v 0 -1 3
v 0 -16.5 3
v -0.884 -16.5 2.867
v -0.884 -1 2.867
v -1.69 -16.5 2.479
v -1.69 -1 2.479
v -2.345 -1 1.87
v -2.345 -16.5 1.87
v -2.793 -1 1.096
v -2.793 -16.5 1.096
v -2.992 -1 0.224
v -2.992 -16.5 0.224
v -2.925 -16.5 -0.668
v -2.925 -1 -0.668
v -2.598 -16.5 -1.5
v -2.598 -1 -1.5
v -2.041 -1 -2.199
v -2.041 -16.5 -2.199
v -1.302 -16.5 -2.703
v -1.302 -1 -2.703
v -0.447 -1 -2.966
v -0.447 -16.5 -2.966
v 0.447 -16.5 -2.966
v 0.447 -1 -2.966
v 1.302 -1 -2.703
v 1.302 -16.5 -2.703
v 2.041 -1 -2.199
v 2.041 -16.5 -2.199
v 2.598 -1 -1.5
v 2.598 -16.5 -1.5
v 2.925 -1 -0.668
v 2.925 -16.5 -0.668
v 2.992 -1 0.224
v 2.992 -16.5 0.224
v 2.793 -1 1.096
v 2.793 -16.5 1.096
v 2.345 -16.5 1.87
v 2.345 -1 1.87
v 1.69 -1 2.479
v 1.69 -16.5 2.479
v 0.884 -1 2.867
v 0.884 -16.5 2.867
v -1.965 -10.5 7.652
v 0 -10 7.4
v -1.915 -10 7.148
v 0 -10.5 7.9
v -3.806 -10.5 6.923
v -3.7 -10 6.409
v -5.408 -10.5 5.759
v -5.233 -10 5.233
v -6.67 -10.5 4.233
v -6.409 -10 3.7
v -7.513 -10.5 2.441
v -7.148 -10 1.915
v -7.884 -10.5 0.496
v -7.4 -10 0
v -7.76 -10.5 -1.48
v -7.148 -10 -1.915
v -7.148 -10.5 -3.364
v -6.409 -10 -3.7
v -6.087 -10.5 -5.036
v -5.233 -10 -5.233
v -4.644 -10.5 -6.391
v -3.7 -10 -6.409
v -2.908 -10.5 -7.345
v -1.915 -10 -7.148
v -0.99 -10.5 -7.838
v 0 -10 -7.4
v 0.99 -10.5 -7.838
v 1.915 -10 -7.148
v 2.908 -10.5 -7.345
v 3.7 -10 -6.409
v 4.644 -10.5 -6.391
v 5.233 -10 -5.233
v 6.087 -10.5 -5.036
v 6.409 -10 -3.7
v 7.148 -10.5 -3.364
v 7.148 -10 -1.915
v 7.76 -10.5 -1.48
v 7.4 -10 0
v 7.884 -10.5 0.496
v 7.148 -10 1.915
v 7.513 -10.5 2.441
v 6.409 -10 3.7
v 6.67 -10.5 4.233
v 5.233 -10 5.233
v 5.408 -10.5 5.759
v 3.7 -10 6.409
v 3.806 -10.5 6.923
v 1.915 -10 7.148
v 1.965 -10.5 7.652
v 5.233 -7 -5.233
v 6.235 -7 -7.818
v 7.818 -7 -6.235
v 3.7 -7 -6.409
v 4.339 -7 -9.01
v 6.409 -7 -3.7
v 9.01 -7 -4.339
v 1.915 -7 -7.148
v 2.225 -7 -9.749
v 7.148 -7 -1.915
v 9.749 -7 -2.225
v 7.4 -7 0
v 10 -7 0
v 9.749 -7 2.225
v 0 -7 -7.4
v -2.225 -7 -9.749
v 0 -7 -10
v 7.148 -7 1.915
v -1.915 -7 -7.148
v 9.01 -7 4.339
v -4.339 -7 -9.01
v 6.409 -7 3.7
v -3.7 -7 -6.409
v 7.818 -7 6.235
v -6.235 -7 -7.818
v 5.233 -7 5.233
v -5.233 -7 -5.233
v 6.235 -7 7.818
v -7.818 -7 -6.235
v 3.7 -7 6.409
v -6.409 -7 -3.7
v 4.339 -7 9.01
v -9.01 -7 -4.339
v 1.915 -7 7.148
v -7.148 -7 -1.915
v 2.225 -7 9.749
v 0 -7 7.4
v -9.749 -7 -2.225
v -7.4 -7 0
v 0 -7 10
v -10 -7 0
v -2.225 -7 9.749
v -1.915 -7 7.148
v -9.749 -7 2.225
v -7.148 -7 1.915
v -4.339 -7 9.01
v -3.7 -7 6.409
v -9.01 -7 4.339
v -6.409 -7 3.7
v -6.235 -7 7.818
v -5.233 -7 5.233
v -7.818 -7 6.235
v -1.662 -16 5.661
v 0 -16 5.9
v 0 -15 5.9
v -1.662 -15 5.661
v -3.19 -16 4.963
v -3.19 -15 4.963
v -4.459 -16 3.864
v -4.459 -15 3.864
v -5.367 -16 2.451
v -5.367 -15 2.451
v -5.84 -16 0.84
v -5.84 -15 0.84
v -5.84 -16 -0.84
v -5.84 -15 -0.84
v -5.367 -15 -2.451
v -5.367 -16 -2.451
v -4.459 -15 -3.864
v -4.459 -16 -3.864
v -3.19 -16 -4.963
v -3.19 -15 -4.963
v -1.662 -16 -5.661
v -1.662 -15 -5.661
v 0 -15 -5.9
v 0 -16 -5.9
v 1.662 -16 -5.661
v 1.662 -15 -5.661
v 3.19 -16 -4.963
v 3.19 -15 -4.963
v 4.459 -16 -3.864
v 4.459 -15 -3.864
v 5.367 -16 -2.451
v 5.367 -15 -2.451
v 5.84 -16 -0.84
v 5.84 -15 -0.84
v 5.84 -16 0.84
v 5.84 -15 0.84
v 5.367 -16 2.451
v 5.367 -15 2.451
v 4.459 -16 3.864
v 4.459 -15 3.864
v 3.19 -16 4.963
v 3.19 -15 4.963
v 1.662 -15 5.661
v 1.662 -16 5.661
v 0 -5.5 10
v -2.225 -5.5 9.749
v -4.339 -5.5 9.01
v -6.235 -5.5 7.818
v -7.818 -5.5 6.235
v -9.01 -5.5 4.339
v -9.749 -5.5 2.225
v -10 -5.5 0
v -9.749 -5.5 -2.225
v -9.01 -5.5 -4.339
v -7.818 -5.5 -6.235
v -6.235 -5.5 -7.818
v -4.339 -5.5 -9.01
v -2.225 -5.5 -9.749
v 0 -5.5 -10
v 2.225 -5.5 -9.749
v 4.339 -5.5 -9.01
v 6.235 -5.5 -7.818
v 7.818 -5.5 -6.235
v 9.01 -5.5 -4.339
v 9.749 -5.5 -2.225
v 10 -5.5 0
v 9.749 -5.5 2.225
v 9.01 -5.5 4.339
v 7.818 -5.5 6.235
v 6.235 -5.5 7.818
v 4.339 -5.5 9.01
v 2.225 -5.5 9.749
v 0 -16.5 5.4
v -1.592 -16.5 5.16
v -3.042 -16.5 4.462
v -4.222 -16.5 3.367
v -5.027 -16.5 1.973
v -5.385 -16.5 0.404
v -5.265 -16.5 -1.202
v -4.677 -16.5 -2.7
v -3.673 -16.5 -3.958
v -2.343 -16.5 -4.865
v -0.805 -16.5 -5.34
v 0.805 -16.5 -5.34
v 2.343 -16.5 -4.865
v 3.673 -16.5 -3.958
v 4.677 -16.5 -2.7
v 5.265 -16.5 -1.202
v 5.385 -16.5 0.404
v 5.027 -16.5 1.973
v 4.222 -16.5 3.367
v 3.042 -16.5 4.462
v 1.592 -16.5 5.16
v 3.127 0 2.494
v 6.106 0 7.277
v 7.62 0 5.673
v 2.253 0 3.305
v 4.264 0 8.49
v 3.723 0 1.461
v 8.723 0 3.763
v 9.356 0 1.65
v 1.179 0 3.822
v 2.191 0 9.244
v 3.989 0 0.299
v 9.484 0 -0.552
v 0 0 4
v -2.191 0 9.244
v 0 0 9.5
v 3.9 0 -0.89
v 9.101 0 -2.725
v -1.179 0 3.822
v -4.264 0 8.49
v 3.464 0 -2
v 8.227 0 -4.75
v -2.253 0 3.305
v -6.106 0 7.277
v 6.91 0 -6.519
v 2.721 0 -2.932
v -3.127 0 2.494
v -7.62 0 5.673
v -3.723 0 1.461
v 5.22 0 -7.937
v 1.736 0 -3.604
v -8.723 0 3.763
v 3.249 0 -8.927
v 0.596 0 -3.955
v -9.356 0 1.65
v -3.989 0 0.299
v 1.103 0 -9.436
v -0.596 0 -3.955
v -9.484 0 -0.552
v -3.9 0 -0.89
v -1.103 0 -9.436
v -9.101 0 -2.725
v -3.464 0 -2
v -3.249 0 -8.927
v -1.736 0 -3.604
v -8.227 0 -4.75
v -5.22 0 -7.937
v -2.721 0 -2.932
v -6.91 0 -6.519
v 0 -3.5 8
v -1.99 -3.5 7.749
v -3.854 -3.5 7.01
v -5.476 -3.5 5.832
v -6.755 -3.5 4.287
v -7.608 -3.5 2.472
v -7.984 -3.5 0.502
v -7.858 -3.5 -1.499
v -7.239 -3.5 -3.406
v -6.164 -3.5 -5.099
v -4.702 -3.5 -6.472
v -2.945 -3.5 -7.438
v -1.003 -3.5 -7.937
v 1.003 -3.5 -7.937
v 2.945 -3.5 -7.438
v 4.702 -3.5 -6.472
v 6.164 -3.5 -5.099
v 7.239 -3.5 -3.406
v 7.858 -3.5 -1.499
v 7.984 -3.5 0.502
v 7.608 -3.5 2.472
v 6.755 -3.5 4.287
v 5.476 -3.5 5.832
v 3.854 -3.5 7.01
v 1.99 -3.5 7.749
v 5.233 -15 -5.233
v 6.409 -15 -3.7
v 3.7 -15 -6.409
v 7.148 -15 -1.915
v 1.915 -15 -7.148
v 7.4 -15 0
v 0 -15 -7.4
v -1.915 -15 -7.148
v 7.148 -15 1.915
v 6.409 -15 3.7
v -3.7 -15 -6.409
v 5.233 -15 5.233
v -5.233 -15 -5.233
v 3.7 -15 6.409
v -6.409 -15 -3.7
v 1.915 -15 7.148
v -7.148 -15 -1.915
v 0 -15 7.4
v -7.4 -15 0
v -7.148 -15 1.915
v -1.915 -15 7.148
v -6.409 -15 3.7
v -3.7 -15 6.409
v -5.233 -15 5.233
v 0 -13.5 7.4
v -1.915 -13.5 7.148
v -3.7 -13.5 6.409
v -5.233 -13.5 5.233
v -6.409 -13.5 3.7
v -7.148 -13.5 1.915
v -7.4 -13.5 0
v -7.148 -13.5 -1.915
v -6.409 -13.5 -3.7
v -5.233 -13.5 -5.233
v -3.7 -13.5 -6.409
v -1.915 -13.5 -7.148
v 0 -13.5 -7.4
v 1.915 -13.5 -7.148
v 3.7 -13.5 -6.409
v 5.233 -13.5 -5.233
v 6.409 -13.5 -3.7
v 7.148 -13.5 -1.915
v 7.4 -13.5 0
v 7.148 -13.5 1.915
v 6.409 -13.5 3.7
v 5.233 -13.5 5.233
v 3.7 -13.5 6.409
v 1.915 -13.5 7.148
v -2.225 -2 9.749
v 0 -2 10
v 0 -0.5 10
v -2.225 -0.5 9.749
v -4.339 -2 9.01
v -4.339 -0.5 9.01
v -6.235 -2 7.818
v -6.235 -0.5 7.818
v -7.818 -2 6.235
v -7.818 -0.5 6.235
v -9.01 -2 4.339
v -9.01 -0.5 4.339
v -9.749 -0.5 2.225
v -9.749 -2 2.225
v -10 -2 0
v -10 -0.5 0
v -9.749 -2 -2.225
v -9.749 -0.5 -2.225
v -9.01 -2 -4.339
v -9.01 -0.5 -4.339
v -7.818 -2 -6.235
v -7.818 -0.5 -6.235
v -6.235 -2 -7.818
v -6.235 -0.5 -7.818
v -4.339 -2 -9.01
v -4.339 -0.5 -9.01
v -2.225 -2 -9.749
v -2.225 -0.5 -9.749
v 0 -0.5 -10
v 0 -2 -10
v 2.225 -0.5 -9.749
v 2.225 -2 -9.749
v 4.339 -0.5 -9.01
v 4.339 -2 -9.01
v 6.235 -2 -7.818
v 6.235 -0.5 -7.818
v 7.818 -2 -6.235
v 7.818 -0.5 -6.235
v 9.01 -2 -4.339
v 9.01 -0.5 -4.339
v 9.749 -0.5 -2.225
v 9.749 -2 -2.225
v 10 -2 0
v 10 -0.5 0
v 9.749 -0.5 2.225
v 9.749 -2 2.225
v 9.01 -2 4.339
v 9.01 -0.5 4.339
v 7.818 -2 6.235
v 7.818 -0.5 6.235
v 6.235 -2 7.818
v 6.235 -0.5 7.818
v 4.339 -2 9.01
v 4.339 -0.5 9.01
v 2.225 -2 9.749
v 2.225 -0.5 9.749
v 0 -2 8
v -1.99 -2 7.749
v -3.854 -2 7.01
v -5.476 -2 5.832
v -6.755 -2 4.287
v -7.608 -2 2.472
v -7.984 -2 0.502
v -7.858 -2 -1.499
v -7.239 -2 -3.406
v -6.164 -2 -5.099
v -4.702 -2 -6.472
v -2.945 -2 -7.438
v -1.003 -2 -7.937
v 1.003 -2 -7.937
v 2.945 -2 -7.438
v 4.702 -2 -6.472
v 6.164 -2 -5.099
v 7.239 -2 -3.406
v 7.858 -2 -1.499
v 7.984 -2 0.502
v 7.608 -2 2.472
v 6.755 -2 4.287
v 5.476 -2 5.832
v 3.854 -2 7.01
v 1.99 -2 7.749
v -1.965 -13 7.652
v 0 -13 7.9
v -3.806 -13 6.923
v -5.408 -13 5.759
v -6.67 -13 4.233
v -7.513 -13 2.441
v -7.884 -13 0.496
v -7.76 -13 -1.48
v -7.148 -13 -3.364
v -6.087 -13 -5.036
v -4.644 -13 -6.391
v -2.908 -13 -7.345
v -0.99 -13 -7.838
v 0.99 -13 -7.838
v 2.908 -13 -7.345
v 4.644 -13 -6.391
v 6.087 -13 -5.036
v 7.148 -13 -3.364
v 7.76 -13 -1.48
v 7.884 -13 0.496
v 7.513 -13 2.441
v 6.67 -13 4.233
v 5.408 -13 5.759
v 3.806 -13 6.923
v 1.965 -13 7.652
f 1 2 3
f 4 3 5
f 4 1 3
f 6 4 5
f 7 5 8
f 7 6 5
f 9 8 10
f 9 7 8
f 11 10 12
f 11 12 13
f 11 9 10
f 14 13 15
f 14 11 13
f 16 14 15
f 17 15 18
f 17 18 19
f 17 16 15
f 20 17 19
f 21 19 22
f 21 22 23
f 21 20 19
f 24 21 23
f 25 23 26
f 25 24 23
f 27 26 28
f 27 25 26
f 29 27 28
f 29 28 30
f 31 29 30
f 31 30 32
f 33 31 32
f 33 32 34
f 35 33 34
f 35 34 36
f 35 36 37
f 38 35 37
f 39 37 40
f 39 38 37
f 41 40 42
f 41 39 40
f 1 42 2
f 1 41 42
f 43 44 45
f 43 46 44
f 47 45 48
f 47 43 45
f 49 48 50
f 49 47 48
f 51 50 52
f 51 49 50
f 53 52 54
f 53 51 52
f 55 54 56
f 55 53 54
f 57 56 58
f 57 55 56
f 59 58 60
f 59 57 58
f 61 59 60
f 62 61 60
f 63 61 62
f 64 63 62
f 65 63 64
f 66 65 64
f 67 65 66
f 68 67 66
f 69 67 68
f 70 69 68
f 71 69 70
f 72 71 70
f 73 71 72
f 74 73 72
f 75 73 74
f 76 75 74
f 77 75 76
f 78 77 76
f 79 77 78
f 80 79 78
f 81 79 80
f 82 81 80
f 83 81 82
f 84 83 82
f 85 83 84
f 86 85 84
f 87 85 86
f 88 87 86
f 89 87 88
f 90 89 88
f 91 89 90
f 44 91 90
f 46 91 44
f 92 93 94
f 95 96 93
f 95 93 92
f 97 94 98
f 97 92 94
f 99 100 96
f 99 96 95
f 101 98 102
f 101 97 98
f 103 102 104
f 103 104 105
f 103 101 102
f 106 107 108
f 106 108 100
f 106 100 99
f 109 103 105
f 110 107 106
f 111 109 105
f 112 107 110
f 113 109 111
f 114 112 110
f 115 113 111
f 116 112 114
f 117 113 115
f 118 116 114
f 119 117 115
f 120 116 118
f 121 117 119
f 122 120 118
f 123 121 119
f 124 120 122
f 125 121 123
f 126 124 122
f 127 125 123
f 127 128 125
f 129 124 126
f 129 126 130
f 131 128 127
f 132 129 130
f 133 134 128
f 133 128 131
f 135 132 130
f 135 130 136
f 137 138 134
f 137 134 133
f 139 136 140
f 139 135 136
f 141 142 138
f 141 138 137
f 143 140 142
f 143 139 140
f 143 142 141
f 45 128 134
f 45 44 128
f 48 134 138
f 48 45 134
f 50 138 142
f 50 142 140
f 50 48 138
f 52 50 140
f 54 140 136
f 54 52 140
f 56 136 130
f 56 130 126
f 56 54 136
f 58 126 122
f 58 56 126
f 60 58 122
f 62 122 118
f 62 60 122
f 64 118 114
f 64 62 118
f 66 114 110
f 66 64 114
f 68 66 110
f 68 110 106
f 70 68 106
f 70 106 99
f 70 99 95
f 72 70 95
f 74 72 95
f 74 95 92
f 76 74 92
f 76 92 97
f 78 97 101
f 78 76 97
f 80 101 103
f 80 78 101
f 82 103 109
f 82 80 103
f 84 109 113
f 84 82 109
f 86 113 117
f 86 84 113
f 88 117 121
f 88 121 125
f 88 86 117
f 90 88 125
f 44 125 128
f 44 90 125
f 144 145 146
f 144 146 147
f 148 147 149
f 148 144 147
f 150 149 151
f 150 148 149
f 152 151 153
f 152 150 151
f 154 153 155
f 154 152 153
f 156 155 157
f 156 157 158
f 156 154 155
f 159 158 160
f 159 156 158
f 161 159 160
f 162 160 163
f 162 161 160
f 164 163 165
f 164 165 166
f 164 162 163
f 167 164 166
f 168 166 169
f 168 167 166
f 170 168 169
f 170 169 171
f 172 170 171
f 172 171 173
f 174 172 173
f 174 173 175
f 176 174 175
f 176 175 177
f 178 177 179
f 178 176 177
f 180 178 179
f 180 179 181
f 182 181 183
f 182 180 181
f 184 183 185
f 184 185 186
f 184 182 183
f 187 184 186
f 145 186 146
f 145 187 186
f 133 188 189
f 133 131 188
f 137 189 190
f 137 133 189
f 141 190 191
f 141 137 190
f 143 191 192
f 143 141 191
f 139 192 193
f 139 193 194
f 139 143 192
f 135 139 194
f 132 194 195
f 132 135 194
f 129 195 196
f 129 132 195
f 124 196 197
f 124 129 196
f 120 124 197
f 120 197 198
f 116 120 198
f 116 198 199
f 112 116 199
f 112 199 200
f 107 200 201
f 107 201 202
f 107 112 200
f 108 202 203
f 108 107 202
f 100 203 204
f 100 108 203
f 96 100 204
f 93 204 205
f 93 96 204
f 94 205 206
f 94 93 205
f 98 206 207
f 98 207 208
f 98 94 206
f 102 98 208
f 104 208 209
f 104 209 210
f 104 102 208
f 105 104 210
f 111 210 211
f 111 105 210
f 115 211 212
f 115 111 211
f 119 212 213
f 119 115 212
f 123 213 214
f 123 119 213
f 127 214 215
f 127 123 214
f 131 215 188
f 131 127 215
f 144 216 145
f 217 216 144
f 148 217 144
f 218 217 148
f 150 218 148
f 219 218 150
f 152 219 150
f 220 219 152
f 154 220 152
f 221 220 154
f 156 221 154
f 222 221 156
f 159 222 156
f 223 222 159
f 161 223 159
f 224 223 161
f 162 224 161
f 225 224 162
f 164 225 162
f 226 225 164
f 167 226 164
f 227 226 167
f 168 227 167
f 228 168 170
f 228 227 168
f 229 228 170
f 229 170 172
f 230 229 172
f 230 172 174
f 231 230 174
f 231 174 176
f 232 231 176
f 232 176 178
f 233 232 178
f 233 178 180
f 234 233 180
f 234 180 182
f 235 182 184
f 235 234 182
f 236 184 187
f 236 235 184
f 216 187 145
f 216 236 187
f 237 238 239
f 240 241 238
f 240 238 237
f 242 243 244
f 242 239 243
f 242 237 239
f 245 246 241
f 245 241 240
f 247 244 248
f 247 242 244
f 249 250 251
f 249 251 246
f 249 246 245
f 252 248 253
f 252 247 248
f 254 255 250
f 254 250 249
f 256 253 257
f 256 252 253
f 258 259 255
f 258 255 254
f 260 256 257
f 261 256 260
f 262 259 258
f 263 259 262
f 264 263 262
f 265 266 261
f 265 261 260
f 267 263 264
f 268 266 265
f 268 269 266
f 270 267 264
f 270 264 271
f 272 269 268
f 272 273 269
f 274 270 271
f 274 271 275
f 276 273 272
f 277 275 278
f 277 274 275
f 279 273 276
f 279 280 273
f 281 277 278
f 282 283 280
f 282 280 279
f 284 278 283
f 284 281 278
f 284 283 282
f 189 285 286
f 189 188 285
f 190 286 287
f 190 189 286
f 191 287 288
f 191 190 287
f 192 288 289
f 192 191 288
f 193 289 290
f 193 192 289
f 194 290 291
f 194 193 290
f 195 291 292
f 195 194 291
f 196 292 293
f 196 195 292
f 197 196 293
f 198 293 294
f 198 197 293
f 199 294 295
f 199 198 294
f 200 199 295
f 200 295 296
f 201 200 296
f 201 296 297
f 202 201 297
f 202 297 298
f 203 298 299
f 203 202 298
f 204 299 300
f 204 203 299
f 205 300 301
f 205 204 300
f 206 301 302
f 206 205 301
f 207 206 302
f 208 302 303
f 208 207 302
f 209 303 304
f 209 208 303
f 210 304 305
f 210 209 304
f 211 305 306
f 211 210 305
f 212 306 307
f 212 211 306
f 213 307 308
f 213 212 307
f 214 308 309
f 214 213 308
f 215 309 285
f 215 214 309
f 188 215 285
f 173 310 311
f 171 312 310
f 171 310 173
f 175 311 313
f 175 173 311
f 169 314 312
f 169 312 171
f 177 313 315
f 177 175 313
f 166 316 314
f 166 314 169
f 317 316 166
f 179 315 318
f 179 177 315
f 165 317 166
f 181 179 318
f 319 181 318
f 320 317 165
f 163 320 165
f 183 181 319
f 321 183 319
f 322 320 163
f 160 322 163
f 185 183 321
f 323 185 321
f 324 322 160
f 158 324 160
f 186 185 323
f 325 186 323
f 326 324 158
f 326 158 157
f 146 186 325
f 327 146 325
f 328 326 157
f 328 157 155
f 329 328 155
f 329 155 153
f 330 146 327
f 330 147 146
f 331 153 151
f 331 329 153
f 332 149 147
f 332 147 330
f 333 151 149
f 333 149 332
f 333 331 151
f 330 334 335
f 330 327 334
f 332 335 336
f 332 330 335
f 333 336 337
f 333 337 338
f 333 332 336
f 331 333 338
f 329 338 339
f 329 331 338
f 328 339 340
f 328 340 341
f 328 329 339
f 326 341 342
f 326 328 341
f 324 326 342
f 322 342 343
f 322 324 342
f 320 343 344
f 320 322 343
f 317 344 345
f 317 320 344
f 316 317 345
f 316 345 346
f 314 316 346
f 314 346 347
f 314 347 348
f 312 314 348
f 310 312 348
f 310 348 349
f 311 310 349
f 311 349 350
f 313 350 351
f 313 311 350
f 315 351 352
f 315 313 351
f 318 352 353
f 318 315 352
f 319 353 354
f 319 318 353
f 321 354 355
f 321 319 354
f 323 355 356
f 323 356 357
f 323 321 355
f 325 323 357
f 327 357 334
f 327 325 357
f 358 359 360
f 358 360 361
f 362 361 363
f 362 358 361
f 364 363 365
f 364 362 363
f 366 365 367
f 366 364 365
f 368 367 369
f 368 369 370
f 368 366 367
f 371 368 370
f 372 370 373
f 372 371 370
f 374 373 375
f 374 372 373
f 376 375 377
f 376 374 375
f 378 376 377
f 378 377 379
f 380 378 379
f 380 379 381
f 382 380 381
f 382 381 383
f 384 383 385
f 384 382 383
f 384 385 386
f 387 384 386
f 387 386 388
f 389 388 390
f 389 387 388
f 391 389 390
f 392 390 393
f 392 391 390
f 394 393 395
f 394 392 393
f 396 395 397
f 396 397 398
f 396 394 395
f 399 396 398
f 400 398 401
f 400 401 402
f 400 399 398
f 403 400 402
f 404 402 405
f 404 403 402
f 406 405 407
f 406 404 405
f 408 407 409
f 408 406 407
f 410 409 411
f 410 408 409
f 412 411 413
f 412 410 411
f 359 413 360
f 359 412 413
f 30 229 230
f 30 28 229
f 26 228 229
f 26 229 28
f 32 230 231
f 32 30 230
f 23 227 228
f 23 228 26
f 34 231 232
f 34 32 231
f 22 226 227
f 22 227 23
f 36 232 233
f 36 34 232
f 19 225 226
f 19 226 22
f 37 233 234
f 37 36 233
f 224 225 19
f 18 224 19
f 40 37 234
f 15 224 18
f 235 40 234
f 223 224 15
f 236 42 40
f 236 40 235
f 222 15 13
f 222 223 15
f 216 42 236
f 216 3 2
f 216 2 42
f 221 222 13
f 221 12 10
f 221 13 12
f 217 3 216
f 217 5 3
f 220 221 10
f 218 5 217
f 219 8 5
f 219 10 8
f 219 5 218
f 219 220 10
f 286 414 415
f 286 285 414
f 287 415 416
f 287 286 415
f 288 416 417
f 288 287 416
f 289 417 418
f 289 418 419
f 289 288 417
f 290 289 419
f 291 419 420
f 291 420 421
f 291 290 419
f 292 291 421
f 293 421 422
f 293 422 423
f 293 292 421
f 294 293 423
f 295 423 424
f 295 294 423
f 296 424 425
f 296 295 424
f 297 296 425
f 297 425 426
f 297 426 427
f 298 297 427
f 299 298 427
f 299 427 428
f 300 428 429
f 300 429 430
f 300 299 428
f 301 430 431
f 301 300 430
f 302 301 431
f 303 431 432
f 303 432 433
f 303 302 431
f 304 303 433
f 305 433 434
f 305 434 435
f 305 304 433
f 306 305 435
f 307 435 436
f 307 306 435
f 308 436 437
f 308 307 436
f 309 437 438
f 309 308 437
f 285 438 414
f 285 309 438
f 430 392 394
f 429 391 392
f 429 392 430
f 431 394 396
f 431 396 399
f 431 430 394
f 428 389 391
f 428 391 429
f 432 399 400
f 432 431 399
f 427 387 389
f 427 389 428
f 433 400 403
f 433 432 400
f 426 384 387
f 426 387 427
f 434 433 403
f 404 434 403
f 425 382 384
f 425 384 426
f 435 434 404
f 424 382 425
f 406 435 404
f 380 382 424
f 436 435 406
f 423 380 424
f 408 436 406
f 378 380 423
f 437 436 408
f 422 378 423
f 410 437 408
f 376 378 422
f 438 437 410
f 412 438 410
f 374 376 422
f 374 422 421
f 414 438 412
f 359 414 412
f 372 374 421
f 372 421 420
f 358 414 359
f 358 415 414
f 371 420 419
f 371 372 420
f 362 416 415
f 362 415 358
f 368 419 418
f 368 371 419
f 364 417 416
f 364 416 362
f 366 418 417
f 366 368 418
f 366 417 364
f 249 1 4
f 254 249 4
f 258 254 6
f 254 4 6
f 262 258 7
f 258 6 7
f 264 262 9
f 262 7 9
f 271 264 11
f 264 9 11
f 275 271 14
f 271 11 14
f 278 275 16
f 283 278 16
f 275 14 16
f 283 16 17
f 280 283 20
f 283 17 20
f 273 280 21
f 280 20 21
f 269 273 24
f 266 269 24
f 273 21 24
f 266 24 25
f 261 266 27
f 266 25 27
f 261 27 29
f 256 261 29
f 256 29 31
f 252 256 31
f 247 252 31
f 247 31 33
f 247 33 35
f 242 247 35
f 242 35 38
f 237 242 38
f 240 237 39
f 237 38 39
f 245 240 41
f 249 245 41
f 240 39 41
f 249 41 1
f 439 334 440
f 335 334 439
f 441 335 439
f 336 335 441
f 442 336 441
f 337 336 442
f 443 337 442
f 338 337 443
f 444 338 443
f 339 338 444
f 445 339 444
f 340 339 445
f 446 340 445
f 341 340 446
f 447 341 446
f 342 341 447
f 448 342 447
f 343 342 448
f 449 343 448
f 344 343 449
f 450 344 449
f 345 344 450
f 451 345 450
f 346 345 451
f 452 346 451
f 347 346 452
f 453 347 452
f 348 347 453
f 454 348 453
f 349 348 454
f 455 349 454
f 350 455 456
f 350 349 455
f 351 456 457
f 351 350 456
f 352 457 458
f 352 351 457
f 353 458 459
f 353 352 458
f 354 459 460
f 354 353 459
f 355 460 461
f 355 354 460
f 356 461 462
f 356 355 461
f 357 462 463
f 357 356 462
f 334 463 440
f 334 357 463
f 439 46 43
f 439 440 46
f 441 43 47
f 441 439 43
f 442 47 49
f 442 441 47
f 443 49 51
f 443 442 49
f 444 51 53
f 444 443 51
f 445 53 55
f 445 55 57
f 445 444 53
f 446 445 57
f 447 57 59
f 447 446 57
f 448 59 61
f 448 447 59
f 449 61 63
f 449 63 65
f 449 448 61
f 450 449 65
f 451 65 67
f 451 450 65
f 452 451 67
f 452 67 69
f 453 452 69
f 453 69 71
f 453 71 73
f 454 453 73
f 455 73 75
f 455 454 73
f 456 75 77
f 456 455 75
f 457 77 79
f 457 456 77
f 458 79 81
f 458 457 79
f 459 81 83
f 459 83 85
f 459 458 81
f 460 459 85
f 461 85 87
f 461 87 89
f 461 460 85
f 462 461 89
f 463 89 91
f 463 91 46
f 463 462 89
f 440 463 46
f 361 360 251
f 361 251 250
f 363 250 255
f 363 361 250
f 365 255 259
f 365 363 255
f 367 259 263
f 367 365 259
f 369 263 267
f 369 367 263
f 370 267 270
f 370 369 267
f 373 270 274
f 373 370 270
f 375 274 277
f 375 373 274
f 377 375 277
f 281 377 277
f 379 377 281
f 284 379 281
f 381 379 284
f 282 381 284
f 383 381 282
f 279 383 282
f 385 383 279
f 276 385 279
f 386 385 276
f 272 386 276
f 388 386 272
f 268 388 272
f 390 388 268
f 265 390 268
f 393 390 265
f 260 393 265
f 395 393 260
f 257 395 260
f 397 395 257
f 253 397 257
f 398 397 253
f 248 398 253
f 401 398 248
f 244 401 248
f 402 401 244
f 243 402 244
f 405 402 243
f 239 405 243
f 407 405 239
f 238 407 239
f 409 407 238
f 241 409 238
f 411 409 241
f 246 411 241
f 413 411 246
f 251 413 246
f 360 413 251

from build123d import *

# Parameters (mm, degrees)
CHAMFER_1_SIZE = 0.5
CHAMFER_2_SIZE = 1


with BuildPart() as part:
    # 스케치2 → 회전1 (revolve)
    with BuildSketch(Plane(origin=(0, 0, 0), x_dir=(0, 0, -1), z_dir=(1, 0, 0)), mode=Mode.PRIVATE) as revolve_1_sk:
        Polygon((3, 0), (10, 0), (10, -2), (8, -2), (8, -3.5), (10, -5.5), (10, -7), (7.4, -7), (7.4, -10), (7.9, -10.5), (7.9, -13), (7.4, -13.5), (7.4, -15), (5.9, -15), (5.9, -16.5), (3, -16.5), align=None)
    revolve(revolve_1_sk.sketch.rotate(Axis((0, 0, 0), (0, -1, 0)), 180), axis=Axis((0, 0, 0), (0, -1, 0)))

    # 모따기1
    chamfer_1_edges = [part.edges().sort_by_distance(p)[0] for p in [
        (0, 0, -10),
        (0, -16.5, -5.9),
    ]]
    chamfer(chamfer_1_edges, length=CHAMFER_1_SIZE)

    # 모따기2
    chamfer_2_edges = [part.edges().sort_by_distance(p)[0] for p in [
        (0, 0, -3),
    ]]
    chamfer(chamfer_2_edges, length=CHAMFER_2_SIZE)


solid = part.part
